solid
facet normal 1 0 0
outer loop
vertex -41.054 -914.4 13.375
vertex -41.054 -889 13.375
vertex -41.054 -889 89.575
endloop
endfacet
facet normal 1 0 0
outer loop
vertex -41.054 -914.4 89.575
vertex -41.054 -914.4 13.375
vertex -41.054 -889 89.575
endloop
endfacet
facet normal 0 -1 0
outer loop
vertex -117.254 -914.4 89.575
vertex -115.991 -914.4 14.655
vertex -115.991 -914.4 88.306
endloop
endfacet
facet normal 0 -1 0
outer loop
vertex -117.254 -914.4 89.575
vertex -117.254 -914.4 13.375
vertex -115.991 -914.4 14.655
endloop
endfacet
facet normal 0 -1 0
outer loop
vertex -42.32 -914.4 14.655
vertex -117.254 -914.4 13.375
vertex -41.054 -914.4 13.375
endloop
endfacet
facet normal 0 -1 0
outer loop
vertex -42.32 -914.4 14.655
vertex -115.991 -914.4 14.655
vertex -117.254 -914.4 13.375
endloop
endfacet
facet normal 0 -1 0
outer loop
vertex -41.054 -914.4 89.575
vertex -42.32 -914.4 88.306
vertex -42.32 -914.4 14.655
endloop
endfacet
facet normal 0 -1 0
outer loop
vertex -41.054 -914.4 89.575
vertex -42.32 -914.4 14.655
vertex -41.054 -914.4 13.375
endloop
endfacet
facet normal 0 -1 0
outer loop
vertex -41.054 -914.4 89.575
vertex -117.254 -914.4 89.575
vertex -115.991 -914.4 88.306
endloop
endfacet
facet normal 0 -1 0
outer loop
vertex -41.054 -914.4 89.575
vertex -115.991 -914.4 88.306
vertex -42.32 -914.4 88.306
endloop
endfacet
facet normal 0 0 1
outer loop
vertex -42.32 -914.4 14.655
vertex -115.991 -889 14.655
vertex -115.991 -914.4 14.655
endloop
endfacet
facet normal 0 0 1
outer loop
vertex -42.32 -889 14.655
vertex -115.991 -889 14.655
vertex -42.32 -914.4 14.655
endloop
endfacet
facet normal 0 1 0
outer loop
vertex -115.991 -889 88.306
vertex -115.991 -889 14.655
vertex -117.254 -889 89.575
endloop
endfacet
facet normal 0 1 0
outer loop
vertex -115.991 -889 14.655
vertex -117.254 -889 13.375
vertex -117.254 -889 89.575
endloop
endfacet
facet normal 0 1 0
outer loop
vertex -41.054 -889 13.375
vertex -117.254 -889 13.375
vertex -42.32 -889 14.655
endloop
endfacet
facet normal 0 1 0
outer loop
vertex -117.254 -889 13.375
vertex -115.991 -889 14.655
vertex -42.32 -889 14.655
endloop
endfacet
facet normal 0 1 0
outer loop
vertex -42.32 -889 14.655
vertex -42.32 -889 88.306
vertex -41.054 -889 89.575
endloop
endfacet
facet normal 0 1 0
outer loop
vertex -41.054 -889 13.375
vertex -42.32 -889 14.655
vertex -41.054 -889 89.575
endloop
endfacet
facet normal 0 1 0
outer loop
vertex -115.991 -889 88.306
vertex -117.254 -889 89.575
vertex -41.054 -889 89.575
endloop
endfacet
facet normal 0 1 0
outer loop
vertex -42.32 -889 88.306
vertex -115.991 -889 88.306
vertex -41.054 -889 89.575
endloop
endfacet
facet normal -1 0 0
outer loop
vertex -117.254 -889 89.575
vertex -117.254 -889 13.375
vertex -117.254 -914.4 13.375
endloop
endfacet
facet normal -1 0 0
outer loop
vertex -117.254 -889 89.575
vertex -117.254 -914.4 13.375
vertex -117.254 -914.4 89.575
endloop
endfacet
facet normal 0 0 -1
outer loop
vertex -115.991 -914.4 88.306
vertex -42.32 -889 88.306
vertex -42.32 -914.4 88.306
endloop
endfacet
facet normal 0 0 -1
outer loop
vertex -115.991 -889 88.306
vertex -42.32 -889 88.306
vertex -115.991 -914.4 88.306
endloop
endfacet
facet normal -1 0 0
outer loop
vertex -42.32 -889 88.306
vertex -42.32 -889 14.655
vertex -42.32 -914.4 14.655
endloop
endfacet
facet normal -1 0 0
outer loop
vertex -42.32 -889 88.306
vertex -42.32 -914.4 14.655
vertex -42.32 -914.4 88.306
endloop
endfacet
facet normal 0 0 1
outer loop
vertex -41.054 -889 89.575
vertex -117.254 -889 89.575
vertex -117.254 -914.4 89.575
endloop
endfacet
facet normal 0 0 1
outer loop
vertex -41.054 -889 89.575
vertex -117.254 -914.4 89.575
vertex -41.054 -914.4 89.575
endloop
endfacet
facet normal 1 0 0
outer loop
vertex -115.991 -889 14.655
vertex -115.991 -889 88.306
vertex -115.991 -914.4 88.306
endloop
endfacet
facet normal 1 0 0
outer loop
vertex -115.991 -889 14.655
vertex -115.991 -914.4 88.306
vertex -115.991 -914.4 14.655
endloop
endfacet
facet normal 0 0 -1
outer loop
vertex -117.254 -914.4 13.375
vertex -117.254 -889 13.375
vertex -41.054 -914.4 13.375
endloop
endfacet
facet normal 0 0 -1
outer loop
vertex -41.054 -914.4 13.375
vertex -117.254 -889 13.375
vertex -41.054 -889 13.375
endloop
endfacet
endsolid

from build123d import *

# Parameters (mm, degrees)
F0_W     = 76.2
F0_H     = 76.2
F1_DEPTH = 609.6
F3_DEPTH = 914.4
F4_DEPTH = 304.8
F5_DEPTH = 508
F6_DEPTH = 381


with BuildPart() as f1:
    # F0 (on Front) → F1 (new body)
    with BuildSketch(Plane.XZ):
        with Locations((-79.1539917648, 51.4746750653)):
            Rectangle(F0_W, F0_H)
    extrude(amount=F1_DEPTH)

    # F2 (on face) → F3 (cut)
    with BuildSketch(Plane.XZ.offset(609.6)):
        Polygon((-42.3204526305, 88.3055701852), (-98.6881405115, 88.3055701852), (-115.9909814596, 88.3055701852), (-115.9909814596, 14.655277133), (-42.3204526305, 14.655277133), align=None)
    extrude(amount=-F3_DEPTH, mode=Mode.SUBTRACT)

    # F4 (add): a face of the model
    f4_faces = [f1.faces().sort_by_distance(p)[0] for p in [
        (-42.1316224993, -609.6, 51.4746750653),
    ]]
    extrude(f4_faces, amount=F4_DEPTH)

    # F5 (cut): a face of the model
    f5_faces = [f1.faces().sort_by_distance(p)[0] for p in [
        (-42.1316224993, 0, 51.4746750653),
    ]]
    extrude(f5_faces, amount=-F5_DEPTH, mode=Mode.SUBTRACT)

    # F6 (cut): a face of the model
    f6_faces = [f1.faces().sort_by_distance(p)[0] for p in [
        (-42.1316224993, -508, 51.4746750653),
    ]]
    extrude(f6_faces, amount=-F6_DEPTH, mode=Mode.SUBTRACT)


solid = f1.part
